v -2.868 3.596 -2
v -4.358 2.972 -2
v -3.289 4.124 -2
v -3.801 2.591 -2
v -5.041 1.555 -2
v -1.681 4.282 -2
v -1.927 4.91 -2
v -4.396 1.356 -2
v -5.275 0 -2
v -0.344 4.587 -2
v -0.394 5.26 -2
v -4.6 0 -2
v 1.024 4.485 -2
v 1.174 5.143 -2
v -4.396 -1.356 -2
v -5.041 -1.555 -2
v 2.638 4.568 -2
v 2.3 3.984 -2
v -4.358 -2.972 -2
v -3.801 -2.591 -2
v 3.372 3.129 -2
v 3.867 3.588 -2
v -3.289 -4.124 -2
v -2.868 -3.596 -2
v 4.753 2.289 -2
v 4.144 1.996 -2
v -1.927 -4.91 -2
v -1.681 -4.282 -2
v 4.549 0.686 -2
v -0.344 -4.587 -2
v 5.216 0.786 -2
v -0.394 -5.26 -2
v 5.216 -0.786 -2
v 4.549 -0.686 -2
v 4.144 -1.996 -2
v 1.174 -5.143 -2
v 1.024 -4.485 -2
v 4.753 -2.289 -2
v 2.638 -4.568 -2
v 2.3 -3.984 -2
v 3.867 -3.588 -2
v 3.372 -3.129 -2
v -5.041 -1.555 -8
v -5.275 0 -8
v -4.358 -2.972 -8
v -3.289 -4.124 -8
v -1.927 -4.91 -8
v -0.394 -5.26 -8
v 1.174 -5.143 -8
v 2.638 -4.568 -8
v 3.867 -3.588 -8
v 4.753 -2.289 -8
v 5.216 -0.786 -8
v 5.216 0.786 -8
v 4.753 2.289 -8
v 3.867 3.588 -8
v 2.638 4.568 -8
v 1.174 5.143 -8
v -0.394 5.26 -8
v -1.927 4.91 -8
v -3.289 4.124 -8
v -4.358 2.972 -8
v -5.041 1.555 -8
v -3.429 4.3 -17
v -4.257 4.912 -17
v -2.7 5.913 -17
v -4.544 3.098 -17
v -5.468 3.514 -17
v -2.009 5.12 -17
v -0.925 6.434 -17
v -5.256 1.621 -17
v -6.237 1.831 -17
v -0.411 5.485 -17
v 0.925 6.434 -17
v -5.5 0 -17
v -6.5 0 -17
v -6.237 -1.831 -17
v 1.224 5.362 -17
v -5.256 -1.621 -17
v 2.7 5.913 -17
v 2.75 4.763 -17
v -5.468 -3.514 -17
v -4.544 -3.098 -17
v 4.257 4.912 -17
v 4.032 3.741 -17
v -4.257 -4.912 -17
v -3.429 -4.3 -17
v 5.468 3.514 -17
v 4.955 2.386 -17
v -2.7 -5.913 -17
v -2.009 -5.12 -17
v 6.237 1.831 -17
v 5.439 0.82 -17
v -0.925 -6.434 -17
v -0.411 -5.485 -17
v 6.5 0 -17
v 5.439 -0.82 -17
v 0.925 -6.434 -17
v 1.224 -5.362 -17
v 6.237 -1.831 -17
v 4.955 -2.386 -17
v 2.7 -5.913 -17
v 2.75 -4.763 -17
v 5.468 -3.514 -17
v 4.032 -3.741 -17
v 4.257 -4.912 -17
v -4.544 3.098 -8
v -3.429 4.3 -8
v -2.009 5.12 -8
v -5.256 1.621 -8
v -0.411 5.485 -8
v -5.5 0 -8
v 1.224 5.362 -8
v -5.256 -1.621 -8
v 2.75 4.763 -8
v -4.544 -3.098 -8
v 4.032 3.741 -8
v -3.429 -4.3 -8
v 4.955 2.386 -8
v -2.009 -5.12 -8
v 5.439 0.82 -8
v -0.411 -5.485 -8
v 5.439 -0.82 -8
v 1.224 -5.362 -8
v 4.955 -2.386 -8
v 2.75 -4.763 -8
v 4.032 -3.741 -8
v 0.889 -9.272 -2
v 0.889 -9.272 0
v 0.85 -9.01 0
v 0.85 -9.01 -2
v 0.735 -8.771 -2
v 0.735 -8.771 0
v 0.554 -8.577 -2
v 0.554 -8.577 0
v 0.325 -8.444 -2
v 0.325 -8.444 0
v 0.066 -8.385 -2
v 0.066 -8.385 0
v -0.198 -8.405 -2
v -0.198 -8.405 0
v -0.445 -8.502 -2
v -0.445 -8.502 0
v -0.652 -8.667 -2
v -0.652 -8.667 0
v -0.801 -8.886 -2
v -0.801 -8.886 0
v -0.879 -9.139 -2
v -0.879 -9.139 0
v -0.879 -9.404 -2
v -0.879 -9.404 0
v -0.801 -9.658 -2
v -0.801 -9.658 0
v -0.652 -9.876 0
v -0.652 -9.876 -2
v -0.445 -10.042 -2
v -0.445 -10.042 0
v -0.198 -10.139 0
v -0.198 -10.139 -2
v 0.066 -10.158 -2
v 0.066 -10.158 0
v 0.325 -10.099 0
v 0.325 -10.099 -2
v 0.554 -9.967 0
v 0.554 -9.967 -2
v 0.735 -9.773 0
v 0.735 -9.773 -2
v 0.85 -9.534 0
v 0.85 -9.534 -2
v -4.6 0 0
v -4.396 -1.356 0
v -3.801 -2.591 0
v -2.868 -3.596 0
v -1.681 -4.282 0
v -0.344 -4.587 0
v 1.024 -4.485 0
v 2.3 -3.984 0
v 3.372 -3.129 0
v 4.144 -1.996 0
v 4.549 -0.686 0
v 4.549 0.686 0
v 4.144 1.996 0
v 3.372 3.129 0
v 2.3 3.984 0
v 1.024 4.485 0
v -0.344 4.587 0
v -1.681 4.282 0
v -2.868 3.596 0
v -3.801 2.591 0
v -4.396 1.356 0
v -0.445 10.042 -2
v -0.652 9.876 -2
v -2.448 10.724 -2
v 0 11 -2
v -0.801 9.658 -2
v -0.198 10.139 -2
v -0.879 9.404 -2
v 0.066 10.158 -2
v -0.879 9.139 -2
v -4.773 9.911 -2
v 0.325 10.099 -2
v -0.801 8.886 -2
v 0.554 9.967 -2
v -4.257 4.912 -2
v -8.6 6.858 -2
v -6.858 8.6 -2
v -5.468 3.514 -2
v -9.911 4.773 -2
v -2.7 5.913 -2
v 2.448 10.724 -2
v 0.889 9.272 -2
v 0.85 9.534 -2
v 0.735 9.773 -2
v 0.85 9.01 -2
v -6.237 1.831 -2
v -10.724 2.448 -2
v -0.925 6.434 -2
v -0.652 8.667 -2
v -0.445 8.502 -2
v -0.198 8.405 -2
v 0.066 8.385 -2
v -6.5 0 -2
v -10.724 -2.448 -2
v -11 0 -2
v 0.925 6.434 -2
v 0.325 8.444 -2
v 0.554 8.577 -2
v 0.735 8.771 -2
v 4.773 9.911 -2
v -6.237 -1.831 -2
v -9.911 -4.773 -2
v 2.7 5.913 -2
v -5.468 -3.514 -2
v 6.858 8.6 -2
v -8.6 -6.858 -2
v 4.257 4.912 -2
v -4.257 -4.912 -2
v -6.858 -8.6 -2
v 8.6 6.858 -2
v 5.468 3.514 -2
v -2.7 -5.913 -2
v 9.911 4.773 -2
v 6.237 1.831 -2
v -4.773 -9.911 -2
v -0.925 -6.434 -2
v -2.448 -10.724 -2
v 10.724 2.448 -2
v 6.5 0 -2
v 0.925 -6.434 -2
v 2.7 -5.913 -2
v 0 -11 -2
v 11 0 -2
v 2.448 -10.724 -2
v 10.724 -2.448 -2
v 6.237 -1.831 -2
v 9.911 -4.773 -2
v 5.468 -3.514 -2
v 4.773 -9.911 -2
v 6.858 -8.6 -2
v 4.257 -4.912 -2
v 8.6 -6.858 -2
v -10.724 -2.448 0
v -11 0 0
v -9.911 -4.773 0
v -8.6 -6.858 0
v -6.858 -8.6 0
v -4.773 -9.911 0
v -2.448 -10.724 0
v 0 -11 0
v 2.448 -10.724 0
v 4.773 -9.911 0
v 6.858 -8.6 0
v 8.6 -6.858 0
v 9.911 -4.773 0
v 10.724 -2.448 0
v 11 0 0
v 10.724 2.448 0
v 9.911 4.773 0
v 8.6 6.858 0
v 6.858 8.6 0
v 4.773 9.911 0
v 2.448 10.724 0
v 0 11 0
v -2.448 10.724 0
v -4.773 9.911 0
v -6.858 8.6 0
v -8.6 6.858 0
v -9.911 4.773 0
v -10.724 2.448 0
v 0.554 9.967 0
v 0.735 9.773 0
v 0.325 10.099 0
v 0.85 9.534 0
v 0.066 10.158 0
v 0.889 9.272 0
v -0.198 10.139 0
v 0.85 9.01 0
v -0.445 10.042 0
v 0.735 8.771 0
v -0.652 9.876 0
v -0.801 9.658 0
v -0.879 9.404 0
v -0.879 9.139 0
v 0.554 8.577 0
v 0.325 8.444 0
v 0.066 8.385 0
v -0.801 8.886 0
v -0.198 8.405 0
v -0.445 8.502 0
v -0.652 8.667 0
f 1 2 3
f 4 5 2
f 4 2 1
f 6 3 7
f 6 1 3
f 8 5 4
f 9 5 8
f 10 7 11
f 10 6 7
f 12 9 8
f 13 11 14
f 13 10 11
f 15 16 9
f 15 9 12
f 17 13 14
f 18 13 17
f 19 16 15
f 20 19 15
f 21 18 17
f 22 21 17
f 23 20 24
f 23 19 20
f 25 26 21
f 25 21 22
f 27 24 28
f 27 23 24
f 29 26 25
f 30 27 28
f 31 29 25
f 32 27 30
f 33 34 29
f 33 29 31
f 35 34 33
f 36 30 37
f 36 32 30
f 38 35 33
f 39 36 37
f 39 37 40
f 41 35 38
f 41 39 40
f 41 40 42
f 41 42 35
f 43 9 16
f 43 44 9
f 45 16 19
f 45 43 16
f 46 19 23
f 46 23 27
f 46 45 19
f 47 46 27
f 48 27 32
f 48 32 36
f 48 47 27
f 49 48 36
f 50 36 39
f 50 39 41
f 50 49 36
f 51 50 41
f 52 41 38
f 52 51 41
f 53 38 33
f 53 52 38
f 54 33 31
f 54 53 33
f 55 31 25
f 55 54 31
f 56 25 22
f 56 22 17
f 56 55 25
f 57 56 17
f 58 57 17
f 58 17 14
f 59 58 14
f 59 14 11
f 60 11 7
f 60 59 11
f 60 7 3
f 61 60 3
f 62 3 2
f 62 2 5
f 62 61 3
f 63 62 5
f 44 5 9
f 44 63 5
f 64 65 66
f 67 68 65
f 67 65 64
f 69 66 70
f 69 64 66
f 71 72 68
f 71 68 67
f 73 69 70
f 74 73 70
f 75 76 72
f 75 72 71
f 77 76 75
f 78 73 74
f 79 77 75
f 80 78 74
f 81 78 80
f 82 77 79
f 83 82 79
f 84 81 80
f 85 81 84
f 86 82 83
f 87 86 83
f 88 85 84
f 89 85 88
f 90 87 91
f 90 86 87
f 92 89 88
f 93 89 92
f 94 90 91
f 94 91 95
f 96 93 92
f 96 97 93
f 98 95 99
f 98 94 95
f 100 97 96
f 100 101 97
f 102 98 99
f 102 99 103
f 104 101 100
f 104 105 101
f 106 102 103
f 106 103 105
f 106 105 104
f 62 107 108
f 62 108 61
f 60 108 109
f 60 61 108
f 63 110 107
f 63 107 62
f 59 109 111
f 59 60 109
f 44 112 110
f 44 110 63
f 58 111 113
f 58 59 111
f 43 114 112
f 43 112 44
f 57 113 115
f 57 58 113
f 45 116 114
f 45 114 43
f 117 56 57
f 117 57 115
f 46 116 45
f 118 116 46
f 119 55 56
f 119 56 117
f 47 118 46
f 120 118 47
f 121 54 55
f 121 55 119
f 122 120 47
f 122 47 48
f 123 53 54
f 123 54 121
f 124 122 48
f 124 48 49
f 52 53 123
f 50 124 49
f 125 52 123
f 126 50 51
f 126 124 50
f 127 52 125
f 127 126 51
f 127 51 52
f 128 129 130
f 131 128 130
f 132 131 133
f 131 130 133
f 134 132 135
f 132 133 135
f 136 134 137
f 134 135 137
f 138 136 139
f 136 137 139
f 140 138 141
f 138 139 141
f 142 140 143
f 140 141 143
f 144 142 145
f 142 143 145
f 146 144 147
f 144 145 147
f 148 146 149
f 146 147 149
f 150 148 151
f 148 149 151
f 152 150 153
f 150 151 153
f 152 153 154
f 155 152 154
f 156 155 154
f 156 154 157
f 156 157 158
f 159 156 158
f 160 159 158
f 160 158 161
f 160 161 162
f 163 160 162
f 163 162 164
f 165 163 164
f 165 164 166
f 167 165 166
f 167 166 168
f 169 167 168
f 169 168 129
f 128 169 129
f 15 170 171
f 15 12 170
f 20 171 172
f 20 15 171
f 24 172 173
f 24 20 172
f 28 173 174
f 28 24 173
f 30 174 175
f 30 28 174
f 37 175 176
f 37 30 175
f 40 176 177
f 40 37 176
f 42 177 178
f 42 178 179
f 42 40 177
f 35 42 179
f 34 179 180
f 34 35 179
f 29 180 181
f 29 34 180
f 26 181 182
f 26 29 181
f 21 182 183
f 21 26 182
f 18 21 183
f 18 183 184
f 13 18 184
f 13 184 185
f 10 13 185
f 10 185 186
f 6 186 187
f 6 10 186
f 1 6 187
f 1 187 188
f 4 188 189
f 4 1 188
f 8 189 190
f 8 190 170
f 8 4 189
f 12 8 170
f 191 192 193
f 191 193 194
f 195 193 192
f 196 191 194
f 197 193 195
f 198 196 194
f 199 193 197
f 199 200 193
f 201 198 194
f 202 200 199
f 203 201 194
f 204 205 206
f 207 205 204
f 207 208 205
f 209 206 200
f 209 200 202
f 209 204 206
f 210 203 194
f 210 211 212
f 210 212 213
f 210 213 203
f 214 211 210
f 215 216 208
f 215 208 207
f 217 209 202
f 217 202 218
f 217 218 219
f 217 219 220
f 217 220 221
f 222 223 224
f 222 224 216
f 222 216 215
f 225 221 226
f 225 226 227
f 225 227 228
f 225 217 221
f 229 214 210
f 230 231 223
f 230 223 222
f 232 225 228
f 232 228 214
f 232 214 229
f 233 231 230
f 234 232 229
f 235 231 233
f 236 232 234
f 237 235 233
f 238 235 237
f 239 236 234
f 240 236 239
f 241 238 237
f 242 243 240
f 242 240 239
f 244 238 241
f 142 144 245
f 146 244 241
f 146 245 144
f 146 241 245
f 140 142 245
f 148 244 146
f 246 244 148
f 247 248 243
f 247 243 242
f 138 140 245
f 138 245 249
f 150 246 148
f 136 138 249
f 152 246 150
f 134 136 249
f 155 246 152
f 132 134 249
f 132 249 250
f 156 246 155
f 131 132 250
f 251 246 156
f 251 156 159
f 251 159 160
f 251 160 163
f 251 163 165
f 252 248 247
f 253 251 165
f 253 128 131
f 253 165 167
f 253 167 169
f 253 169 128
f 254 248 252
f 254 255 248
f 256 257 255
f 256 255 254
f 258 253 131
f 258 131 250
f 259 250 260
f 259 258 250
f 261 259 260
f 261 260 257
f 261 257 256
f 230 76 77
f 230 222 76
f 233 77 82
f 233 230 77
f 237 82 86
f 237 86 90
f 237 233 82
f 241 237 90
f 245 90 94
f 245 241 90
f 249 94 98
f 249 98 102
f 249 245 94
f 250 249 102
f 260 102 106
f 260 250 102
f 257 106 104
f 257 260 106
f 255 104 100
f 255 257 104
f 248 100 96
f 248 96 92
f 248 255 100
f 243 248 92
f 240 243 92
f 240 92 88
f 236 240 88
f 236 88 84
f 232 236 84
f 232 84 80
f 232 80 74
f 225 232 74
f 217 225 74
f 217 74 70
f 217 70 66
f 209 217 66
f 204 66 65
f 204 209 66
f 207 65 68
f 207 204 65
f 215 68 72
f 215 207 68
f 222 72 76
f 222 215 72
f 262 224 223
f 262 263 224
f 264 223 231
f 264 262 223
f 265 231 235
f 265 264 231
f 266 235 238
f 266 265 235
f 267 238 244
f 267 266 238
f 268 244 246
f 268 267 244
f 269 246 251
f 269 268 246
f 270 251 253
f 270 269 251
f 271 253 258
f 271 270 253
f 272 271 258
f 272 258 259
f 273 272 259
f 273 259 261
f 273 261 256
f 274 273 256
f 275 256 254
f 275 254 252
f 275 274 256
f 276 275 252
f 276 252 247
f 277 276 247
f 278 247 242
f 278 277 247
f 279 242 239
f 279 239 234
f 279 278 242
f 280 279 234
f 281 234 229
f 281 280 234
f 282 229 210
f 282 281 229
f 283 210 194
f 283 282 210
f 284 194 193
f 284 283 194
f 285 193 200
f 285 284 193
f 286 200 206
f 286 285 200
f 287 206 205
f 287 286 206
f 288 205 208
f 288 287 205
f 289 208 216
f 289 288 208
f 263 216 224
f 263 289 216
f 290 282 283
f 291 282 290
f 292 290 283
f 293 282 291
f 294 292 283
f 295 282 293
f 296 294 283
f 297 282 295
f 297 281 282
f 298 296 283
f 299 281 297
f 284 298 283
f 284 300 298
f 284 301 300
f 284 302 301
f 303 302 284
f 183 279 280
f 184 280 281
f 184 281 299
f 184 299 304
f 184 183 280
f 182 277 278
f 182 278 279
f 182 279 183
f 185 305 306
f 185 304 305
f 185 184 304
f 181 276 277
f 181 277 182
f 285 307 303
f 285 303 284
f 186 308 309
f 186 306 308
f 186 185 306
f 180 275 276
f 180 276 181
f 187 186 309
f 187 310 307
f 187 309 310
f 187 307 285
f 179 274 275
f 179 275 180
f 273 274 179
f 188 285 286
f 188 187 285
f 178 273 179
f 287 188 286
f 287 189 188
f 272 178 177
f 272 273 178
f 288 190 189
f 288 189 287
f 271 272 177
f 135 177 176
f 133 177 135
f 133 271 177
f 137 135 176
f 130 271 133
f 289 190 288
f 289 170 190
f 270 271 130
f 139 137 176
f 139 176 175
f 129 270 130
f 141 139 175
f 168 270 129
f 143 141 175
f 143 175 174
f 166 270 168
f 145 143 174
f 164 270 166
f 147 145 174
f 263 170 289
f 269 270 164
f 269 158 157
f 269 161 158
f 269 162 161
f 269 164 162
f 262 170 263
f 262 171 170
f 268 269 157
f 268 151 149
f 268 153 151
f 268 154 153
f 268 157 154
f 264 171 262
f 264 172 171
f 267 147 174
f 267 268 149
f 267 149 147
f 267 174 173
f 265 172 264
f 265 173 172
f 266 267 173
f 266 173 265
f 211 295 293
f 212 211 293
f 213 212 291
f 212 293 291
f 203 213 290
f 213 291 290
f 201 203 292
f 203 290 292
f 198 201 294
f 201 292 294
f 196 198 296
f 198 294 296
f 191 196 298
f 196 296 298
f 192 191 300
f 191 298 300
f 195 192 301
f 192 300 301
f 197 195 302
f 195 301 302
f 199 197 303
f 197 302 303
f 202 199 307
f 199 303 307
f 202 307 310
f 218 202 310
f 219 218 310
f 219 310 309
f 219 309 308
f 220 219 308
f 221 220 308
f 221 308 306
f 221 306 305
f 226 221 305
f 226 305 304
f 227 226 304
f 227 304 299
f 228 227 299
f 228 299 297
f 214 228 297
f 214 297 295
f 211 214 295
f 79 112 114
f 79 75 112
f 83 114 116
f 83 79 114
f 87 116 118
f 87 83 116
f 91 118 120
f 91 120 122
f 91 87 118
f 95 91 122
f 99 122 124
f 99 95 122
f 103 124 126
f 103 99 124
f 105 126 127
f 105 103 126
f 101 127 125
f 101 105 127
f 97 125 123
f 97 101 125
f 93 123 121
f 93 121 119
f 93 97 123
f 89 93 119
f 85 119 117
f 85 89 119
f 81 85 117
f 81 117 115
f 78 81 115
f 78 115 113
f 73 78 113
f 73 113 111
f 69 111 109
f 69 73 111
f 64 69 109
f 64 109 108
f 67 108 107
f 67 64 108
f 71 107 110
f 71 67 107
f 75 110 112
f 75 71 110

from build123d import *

# Parameters (mm, degrees)
F_0_CLEARANCE_HOLE1_D     = 1.778
F_0_CLEARANCE_HOLE1_DEPTH = 19.05
F_0_CLEARANCE_HOLE1_TIP   = 0.53416509


with BuildPart() as part:
    # Sketch1 → Revolve1 (revolve)
    with BuildSketch(Plane(origin=(0, 0, 0), x_dir=(0, 0, -1), z_dir=(1, 0, 0)), mode=Mode.PRIVATE) as revolve1_sk:
        Polygon((0, 11), (0, 4.6), (2, 4.6), (2, 5.275), (8, 5.275), (8, 5.5), (17, 5.5), (17, 6.5), (2, 6.5), (2, 11), align=None)
    revolve(revolve1_sk.sketch.rotate(Axis((0, 0, 0), (0, 0, 1)), 90), axis=Axis((0, 0, 0), (0, 0, 1)))  # turned: the seam where the file's is

    # #0 Clearance Hole1
    with Locations(Plane(origin=(0, 0, -2), x_dir=(-1, 0, 0), z_dir=(0, 0, -1))):
        with Locations((0, 9.2718), (0, -9.2718)):
            Hole(F_0_CLEARANCE_HOLE1_D / 2, depth=F_0_CLEARANCE_HOLE1_DEPTH)
            with Locations((0, 0, -(F_0_CLEARANCE_HOLE1_DEPTH + F_0_CLEARANCE_HOLE1_TIP / 2))):  # 118° drill point
                Cone(0, F_0_CLEARANCE_HOLE1_D / 2, F_0_CLEARANCE_HOLE1_TIP, mode=Mode.SUBTRACT)


solid = part.part
